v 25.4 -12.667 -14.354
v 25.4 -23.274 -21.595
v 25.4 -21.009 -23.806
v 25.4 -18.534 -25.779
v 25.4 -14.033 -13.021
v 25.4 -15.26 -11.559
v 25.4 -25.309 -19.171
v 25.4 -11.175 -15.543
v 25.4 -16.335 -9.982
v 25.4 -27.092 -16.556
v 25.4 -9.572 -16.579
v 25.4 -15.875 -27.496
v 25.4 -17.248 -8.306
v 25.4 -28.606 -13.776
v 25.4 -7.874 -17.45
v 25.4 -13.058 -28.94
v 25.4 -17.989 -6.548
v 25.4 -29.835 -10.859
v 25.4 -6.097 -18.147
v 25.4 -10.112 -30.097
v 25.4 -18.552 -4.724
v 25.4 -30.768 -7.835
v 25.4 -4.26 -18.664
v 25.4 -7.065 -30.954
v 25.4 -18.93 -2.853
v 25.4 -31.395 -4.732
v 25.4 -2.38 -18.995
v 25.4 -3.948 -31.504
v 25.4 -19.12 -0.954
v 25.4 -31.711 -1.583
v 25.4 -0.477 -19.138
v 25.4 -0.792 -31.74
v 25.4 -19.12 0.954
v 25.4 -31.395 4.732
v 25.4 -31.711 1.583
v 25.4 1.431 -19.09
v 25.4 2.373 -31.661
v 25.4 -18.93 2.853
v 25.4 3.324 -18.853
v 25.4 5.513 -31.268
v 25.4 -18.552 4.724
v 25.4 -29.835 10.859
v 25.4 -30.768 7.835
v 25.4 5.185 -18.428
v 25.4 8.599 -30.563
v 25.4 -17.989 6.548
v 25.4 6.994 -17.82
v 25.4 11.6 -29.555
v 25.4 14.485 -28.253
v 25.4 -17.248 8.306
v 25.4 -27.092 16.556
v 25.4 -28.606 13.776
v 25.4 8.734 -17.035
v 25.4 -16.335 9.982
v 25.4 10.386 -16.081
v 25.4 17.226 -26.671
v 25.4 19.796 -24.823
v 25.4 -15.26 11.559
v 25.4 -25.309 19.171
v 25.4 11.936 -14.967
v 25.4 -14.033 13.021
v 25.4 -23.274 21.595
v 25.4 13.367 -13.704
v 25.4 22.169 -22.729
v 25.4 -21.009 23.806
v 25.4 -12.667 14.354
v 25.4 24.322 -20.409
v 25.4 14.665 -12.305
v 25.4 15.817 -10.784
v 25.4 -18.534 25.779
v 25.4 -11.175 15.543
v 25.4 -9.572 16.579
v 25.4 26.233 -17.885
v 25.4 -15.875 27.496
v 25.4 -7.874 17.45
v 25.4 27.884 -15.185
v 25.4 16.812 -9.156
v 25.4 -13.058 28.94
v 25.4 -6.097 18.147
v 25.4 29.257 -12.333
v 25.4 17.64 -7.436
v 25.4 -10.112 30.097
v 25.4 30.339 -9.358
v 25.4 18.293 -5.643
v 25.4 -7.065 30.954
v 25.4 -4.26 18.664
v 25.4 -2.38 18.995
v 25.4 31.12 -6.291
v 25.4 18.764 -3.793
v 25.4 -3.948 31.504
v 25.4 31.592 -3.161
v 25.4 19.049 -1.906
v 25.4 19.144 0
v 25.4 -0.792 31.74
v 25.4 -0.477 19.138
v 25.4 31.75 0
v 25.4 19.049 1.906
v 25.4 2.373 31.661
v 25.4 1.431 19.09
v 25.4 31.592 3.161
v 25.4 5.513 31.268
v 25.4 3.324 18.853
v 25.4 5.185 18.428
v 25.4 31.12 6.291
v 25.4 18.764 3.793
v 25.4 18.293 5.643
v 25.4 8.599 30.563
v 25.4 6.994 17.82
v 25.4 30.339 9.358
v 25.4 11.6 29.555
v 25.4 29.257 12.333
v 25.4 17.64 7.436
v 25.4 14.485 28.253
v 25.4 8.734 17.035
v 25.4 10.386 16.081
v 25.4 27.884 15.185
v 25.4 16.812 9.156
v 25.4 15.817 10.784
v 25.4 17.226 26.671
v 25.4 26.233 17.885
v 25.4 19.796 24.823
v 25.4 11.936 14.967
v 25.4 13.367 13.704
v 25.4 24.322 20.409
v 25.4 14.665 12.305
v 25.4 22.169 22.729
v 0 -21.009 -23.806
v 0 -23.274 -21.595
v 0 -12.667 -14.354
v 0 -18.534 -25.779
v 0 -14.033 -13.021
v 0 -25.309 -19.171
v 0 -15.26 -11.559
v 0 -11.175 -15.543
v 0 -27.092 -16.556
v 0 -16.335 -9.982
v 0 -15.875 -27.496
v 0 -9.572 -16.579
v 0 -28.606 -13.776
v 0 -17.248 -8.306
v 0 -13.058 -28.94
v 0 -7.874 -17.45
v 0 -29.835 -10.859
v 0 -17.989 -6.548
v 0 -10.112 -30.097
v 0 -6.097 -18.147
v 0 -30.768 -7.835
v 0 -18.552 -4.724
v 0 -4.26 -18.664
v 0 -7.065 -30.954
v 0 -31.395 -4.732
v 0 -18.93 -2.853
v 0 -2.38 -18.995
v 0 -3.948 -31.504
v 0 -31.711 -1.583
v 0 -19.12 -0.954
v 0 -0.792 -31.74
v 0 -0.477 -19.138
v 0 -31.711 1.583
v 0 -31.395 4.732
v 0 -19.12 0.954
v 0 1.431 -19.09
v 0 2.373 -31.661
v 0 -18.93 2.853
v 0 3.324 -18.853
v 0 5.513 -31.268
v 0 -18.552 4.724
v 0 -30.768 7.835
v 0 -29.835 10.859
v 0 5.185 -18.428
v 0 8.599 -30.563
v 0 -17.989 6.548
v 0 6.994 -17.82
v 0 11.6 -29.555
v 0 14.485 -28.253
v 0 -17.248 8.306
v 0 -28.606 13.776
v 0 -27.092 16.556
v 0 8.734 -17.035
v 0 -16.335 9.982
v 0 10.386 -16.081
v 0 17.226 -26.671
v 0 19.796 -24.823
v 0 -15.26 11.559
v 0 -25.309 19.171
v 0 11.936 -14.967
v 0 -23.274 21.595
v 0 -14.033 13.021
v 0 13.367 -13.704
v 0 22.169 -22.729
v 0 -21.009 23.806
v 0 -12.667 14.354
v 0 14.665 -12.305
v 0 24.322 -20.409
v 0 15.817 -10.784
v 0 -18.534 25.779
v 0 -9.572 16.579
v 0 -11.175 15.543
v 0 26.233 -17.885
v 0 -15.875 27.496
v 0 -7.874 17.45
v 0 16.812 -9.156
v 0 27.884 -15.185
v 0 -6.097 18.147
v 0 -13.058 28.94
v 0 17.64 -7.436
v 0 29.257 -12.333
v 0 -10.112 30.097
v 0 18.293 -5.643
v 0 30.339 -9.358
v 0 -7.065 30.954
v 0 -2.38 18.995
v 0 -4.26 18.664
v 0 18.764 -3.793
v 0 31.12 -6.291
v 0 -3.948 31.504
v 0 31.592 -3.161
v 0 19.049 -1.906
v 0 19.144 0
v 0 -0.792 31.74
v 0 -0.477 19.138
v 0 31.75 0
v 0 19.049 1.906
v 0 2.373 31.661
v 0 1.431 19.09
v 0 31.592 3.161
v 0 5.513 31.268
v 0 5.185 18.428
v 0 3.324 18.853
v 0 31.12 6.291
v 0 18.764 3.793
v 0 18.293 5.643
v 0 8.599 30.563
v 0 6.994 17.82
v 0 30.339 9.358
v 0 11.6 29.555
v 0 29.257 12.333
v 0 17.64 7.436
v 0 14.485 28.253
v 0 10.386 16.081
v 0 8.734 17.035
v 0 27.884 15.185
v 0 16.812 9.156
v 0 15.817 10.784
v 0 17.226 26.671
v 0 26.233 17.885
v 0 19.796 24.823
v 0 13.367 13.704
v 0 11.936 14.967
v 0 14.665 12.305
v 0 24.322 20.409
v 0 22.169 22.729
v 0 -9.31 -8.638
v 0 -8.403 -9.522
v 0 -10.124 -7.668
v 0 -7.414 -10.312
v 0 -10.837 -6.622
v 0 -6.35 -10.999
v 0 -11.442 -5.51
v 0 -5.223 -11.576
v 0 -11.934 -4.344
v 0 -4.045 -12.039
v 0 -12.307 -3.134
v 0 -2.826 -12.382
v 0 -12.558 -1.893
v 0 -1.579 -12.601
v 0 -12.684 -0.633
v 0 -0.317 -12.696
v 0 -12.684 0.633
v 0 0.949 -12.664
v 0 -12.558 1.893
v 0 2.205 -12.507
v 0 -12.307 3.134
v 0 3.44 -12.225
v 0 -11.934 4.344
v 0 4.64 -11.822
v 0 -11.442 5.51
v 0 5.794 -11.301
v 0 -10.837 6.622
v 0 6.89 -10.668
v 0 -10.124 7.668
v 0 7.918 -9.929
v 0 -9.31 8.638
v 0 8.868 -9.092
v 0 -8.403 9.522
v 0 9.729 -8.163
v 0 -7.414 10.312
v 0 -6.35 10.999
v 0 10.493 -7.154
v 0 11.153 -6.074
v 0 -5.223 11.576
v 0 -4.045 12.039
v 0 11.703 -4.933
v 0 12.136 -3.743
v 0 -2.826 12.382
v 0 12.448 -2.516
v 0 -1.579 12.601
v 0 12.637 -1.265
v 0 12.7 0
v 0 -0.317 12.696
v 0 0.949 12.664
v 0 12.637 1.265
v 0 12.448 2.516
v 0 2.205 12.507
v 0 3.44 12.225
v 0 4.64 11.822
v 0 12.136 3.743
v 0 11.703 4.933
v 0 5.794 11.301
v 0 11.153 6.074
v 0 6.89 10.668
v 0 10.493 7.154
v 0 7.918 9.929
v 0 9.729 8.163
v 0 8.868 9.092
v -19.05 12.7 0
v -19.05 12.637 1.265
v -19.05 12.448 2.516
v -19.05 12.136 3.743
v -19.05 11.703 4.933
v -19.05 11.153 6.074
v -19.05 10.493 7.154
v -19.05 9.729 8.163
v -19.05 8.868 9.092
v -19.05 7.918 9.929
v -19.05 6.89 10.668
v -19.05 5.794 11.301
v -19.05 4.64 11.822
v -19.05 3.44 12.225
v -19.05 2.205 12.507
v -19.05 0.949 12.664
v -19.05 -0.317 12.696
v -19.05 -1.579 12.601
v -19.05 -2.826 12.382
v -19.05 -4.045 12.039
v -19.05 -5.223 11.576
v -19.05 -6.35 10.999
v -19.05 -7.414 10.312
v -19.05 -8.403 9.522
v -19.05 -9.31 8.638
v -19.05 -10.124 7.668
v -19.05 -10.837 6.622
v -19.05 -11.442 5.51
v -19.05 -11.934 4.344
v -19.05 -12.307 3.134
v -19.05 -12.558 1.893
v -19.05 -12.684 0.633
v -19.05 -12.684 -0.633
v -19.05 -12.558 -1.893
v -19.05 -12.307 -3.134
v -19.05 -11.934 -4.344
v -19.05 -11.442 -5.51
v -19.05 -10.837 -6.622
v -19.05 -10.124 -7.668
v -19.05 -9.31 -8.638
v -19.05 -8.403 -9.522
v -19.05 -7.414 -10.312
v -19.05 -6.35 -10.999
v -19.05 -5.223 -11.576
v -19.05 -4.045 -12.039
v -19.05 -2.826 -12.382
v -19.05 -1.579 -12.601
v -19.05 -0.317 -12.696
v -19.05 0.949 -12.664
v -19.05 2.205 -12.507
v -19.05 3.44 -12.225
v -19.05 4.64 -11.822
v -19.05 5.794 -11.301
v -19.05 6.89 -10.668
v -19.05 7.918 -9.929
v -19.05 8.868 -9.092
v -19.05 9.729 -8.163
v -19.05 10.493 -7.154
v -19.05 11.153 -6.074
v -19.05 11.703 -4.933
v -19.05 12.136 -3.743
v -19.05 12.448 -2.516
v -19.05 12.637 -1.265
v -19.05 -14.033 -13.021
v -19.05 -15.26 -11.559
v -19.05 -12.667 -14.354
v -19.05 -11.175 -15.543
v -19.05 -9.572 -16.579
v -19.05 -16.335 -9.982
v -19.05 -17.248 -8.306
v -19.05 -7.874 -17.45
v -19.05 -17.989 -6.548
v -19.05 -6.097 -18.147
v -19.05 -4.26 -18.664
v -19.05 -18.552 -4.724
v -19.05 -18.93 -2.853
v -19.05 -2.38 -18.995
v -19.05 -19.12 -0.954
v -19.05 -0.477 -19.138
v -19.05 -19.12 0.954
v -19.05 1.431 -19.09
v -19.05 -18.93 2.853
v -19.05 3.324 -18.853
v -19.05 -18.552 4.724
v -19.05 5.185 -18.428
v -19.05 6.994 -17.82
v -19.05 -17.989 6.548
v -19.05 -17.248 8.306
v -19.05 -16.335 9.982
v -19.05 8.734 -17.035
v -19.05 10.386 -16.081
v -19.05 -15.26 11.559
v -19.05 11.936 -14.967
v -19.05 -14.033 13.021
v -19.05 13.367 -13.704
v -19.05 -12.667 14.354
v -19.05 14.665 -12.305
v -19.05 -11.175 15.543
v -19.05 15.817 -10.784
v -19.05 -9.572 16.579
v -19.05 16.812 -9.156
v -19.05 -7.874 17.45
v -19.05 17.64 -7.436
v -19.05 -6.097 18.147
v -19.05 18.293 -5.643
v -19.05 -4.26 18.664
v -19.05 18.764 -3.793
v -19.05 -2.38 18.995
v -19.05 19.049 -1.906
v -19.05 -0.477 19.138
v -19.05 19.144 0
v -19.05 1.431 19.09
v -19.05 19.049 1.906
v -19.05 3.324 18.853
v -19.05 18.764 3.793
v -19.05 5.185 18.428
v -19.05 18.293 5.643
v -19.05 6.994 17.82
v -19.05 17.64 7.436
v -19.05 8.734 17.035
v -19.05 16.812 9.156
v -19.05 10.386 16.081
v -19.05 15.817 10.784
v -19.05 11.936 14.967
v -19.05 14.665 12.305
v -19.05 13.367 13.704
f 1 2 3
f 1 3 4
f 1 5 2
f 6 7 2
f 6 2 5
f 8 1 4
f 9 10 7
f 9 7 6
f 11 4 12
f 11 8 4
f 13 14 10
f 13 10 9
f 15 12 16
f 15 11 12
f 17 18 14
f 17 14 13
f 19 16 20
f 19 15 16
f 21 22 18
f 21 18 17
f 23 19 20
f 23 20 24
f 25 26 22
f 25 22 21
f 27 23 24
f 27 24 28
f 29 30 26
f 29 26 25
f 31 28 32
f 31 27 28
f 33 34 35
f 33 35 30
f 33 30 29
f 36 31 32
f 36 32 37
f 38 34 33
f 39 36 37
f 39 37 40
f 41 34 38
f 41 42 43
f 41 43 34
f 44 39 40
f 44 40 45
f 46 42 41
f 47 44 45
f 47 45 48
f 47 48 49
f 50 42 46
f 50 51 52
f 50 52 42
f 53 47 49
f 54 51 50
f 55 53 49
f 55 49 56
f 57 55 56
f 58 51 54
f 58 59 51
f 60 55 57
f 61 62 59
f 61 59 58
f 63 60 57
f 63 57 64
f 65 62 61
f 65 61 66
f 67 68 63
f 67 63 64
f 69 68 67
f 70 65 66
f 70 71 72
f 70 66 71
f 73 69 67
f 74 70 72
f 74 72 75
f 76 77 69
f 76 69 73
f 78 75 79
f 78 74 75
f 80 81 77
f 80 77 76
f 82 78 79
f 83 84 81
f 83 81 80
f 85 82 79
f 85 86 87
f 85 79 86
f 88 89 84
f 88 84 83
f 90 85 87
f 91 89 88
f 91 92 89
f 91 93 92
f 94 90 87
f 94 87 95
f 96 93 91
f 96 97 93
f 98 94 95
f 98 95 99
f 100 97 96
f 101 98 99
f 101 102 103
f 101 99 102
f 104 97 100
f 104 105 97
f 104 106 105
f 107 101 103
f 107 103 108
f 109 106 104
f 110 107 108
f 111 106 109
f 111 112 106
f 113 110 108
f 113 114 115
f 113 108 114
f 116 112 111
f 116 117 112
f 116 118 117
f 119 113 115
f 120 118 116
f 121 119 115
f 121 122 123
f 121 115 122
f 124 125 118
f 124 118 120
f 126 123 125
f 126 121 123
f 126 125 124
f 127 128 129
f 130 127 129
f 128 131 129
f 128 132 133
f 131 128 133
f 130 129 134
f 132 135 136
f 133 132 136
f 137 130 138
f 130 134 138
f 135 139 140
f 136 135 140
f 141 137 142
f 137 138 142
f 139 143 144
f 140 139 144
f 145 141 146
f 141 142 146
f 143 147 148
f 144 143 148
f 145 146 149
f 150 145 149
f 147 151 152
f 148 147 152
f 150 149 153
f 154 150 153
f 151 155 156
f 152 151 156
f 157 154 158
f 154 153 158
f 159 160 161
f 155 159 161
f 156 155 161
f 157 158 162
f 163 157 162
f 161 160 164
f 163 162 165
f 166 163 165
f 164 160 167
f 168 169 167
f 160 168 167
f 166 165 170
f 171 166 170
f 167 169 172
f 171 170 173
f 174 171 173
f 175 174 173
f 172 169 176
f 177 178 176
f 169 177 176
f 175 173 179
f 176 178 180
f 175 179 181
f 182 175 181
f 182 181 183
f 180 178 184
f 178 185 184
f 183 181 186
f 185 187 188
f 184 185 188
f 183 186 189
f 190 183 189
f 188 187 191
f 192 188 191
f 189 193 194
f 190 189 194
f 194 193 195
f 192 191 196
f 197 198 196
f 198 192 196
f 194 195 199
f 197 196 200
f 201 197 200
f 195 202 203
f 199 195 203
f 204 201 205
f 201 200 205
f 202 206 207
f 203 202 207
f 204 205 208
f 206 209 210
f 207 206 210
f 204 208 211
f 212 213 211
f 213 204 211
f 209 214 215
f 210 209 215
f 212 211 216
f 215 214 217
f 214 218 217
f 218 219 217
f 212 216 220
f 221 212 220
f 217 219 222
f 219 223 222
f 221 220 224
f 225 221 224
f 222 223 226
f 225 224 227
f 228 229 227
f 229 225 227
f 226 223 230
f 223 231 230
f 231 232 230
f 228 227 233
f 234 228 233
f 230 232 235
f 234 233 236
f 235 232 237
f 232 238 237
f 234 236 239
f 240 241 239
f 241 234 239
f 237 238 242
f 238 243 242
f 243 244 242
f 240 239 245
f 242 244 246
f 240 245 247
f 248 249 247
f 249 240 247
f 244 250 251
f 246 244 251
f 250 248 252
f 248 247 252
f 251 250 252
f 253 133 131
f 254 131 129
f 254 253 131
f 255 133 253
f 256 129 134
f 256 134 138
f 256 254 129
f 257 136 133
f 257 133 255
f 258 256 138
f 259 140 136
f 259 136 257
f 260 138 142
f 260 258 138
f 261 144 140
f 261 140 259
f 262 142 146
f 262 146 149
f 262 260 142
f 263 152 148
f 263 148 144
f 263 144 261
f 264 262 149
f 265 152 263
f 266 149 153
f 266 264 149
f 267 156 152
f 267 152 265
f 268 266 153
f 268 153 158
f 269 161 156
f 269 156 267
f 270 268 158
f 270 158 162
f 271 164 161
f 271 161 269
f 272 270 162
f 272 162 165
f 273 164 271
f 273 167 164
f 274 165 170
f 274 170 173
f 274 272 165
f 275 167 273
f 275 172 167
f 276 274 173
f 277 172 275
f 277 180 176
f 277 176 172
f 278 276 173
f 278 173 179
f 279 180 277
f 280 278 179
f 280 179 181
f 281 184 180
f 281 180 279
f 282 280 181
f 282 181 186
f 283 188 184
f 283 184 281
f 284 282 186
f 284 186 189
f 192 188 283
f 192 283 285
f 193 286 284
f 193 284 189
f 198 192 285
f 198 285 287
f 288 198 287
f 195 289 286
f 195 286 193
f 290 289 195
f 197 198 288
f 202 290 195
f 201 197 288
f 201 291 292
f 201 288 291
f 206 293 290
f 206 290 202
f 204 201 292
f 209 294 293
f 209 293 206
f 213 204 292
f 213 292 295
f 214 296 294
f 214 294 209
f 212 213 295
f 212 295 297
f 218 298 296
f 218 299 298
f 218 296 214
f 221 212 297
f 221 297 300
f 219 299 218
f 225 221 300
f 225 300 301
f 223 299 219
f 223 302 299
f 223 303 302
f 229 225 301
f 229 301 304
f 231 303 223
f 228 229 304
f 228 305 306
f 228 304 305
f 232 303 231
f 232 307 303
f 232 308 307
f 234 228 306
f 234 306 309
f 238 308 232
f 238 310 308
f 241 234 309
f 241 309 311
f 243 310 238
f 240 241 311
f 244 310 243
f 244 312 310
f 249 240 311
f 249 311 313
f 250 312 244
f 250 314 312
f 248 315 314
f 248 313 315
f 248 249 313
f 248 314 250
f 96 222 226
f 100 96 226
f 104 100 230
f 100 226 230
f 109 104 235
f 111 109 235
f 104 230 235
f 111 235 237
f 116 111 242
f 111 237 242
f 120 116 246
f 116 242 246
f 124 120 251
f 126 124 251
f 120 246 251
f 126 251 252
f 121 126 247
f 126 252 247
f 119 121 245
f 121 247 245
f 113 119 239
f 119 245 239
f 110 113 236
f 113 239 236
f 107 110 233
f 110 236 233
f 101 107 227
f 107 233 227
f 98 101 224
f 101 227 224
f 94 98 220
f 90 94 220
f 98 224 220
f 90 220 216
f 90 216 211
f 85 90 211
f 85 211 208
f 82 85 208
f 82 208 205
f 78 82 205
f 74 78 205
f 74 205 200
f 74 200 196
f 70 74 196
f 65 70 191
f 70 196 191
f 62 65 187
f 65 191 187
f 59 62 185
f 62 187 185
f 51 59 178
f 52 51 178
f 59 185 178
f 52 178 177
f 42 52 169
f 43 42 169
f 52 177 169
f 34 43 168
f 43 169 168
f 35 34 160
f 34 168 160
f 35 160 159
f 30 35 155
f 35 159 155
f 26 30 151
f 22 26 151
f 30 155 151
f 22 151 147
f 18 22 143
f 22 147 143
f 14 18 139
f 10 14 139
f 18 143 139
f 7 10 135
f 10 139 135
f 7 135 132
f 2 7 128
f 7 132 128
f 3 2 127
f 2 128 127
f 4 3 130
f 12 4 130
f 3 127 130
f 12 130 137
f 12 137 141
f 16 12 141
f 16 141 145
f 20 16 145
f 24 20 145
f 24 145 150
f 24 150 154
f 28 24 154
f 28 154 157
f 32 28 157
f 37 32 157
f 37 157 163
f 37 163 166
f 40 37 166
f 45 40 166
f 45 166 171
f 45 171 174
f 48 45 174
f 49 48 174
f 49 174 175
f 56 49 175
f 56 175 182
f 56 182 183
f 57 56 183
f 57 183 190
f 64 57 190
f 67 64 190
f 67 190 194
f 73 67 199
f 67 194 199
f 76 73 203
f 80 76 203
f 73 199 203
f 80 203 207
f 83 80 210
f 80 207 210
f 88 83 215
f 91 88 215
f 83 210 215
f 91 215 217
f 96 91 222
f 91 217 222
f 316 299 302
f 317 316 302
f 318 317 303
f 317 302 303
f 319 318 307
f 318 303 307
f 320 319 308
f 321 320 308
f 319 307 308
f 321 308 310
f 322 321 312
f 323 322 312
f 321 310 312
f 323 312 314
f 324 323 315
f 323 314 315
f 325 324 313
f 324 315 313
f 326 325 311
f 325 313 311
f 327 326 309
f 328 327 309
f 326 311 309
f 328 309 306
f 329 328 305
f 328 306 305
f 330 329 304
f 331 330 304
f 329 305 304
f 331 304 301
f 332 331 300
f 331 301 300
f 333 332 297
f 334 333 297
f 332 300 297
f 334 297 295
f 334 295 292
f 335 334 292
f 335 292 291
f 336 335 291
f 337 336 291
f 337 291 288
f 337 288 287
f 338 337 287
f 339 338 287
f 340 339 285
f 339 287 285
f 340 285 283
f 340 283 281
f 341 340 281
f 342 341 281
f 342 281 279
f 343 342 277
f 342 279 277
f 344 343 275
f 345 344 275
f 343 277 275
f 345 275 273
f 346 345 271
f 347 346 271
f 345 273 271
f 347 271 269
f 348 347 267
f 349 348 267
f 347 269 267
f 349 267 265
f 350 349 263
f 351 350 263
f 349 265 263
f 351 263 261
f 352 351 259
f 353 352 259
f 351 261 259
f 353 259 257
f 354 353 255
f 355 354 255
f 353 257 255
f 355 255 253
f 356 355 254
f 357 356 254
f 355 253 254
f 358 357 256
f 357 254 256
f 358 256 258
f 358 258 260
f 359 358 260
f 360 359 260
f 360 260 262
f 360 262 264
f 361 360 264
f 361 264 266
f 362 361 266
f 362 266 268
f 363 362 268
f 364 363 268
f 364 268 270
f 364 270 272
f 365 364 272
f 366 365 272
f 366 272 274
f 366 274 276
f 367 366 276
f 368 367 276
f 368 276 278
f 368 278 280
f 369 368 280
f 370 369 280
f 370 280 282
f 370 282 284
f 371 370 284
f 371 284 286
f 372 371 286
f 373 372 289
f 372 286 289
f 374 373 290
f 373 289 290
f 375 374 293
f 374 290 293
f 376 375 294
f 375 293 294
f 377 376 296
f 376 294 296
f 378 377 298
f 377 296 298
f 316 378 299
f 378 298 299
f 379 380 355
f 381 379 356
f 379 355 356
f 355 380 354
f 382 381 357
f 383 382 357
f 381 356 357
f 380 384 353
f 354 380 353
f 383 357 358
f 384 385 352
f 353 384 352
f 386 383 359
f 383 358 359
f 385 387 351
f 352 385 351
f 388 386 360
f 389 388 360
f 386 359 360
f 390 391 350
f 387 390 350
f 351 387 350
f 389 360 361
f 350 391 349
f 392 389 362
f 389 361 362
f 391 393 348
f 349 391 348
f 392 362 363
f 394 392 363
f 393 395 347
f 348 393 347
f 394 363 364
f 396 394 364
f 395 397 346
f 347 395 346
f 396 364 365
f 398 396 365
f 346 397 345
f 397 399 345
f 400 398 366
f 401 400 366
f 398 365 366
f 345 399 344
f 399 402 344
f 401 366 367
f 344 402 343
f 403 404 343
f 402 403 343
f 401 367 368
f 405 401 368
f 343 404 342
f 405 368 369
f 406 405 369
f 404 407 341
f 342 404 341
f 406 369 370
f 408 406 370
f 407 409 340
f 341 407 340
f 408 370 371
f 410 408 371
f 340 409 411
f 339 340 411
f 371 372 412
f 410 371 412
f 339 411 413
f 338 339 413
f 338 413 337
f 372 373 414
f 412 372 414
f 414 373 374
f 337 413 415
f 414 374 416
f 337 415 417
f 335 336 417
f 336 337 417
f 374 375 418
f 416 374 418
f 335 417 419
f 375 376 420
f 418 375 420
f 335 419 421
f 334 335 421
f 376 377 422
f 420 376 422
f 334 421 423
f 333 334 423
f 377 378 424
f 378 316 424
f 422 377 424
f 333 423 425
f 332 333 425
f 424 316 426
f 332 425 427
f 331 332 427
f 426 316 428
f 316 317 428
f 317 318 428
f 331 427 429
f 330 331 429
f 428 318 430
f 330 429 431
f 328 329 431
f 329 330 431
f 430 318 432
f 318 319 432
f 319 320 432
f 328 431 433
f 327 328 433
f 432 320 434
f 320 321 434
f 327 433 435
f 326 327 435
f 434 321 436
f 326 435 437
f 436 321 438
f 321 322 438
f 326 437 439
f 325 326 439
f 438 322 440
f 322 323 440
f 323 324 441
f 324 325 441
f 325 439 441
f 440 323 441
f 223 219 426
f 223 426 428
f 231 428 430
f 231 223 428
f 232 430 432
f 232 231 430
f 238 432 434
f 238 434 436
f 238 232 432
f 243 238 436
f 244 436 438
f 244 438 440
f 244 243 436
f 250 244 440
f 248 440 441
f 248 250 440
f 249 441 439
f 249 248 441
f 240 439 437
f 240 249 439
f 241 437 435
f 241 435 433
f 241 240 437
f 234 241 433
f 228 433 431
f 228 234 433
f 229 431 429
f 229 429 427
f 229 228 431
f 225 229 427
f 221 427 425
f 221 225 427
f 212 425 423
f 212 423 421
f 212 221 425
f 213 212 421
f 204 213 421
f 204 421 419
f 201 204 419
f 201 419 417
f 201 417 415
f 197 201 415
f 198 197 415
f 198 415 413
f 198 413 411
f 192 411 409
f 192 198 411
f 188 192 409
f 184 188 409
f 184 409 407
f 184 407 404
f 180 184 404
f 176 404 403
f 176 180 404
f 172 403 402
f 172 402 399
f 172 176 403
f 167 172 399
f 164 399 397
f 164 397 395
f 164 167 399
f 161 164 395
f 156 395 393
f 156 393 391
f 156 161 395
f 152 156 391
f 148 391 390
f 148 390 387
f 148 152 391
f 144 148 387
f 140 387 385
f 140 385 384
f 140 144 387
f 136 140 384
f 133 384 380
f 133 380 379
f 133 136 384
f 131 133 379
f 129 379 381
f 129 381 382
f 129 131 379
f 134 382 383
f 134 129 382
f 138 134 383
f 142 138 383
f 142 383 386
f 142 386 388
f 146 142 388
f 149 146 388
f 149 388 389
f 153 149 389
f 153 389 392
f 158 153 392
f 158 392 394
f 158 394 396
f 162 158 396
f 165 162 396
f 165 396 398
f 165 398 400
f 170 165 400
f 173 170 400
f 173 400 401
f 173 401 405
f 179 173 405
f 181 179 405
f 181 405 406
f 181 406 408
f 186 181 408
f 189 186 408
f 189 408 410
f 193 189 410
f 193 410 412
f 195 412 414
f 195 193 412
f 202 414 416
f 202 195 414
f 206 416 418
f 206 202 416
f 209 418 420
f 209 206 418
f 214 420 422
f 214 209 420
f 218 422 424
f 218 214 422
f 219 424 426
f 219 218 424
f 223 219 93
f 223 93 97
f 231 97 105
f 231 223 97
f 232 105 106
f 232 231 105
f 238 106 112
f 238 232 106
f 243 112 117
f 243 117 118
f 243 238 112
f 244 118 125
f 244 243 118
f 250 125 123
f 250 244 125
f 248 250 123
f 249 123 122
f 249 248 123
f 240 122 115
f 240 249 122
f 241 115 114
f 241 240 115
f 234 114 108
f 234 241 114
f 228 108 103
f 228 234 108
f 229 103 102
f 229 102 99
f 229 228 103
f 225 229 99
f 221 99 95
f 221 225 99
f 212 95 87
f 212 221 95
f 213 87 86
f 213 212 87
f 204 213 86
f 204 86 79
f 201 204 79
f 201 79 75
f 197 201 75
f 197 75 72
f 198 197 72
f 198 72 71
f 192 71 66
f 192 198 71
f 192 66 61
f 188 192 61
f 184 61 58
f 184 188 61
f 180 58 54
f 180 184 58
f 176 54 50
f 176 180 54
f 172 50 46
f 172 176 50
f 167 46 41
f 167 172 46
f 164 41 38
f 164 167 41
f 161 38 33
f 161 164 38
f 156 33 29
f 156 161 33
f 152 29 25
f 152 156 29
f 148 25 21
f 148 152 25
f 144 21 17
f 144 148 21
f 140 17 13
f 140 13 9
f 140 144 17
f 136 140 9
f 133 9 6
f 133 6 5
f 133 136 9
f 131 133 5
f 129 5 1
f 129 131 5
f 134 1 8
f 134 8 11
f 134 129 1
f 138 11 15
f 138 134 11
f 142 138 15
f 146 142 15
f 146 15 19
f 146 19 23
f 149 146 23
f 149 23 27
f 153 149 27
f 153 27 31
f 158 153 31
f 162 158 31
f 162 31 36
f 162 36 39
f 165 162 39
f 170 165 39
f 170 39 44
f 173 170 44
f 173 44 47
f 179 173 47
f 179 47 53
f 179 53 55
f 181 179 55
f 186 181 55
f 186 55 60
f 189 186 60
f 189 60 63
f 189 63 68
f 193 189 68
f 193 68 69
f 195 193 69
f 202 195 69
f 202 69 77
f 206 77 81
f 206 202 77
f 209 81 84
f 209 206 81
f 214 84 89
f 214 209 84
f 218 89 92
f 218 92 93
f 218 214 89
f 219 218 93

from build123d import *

# Parameters (mm, degrees)
F0_R     = 31.75
F0_R_2   = 19.143636
F1_DEPTH = 25.4
F0_R_3   = 12.7
F2_DEPTH = 19.05


with BuildPart() as f1:
    # F0 (on Right) → F1 (new body)
    with BuildSketch(Plane.YZ):
        Circle(F0_R)
        Circle(F0_R_2, mode=Mode.SUBTRACT)
    extrude(amount=F1_DEPTH)


with BuildPart() as f2:
    # F0 (on Right) → F2 (new body)
    with BuildSketch(Plane.YZ):
        Circle(F0_R_2)
        Circle(F0_R_3, mode=Mode.SUBTRACT)
    extrude(amount=-F2_DEPTH)


solid = Compound([f1.part, f2.part])
